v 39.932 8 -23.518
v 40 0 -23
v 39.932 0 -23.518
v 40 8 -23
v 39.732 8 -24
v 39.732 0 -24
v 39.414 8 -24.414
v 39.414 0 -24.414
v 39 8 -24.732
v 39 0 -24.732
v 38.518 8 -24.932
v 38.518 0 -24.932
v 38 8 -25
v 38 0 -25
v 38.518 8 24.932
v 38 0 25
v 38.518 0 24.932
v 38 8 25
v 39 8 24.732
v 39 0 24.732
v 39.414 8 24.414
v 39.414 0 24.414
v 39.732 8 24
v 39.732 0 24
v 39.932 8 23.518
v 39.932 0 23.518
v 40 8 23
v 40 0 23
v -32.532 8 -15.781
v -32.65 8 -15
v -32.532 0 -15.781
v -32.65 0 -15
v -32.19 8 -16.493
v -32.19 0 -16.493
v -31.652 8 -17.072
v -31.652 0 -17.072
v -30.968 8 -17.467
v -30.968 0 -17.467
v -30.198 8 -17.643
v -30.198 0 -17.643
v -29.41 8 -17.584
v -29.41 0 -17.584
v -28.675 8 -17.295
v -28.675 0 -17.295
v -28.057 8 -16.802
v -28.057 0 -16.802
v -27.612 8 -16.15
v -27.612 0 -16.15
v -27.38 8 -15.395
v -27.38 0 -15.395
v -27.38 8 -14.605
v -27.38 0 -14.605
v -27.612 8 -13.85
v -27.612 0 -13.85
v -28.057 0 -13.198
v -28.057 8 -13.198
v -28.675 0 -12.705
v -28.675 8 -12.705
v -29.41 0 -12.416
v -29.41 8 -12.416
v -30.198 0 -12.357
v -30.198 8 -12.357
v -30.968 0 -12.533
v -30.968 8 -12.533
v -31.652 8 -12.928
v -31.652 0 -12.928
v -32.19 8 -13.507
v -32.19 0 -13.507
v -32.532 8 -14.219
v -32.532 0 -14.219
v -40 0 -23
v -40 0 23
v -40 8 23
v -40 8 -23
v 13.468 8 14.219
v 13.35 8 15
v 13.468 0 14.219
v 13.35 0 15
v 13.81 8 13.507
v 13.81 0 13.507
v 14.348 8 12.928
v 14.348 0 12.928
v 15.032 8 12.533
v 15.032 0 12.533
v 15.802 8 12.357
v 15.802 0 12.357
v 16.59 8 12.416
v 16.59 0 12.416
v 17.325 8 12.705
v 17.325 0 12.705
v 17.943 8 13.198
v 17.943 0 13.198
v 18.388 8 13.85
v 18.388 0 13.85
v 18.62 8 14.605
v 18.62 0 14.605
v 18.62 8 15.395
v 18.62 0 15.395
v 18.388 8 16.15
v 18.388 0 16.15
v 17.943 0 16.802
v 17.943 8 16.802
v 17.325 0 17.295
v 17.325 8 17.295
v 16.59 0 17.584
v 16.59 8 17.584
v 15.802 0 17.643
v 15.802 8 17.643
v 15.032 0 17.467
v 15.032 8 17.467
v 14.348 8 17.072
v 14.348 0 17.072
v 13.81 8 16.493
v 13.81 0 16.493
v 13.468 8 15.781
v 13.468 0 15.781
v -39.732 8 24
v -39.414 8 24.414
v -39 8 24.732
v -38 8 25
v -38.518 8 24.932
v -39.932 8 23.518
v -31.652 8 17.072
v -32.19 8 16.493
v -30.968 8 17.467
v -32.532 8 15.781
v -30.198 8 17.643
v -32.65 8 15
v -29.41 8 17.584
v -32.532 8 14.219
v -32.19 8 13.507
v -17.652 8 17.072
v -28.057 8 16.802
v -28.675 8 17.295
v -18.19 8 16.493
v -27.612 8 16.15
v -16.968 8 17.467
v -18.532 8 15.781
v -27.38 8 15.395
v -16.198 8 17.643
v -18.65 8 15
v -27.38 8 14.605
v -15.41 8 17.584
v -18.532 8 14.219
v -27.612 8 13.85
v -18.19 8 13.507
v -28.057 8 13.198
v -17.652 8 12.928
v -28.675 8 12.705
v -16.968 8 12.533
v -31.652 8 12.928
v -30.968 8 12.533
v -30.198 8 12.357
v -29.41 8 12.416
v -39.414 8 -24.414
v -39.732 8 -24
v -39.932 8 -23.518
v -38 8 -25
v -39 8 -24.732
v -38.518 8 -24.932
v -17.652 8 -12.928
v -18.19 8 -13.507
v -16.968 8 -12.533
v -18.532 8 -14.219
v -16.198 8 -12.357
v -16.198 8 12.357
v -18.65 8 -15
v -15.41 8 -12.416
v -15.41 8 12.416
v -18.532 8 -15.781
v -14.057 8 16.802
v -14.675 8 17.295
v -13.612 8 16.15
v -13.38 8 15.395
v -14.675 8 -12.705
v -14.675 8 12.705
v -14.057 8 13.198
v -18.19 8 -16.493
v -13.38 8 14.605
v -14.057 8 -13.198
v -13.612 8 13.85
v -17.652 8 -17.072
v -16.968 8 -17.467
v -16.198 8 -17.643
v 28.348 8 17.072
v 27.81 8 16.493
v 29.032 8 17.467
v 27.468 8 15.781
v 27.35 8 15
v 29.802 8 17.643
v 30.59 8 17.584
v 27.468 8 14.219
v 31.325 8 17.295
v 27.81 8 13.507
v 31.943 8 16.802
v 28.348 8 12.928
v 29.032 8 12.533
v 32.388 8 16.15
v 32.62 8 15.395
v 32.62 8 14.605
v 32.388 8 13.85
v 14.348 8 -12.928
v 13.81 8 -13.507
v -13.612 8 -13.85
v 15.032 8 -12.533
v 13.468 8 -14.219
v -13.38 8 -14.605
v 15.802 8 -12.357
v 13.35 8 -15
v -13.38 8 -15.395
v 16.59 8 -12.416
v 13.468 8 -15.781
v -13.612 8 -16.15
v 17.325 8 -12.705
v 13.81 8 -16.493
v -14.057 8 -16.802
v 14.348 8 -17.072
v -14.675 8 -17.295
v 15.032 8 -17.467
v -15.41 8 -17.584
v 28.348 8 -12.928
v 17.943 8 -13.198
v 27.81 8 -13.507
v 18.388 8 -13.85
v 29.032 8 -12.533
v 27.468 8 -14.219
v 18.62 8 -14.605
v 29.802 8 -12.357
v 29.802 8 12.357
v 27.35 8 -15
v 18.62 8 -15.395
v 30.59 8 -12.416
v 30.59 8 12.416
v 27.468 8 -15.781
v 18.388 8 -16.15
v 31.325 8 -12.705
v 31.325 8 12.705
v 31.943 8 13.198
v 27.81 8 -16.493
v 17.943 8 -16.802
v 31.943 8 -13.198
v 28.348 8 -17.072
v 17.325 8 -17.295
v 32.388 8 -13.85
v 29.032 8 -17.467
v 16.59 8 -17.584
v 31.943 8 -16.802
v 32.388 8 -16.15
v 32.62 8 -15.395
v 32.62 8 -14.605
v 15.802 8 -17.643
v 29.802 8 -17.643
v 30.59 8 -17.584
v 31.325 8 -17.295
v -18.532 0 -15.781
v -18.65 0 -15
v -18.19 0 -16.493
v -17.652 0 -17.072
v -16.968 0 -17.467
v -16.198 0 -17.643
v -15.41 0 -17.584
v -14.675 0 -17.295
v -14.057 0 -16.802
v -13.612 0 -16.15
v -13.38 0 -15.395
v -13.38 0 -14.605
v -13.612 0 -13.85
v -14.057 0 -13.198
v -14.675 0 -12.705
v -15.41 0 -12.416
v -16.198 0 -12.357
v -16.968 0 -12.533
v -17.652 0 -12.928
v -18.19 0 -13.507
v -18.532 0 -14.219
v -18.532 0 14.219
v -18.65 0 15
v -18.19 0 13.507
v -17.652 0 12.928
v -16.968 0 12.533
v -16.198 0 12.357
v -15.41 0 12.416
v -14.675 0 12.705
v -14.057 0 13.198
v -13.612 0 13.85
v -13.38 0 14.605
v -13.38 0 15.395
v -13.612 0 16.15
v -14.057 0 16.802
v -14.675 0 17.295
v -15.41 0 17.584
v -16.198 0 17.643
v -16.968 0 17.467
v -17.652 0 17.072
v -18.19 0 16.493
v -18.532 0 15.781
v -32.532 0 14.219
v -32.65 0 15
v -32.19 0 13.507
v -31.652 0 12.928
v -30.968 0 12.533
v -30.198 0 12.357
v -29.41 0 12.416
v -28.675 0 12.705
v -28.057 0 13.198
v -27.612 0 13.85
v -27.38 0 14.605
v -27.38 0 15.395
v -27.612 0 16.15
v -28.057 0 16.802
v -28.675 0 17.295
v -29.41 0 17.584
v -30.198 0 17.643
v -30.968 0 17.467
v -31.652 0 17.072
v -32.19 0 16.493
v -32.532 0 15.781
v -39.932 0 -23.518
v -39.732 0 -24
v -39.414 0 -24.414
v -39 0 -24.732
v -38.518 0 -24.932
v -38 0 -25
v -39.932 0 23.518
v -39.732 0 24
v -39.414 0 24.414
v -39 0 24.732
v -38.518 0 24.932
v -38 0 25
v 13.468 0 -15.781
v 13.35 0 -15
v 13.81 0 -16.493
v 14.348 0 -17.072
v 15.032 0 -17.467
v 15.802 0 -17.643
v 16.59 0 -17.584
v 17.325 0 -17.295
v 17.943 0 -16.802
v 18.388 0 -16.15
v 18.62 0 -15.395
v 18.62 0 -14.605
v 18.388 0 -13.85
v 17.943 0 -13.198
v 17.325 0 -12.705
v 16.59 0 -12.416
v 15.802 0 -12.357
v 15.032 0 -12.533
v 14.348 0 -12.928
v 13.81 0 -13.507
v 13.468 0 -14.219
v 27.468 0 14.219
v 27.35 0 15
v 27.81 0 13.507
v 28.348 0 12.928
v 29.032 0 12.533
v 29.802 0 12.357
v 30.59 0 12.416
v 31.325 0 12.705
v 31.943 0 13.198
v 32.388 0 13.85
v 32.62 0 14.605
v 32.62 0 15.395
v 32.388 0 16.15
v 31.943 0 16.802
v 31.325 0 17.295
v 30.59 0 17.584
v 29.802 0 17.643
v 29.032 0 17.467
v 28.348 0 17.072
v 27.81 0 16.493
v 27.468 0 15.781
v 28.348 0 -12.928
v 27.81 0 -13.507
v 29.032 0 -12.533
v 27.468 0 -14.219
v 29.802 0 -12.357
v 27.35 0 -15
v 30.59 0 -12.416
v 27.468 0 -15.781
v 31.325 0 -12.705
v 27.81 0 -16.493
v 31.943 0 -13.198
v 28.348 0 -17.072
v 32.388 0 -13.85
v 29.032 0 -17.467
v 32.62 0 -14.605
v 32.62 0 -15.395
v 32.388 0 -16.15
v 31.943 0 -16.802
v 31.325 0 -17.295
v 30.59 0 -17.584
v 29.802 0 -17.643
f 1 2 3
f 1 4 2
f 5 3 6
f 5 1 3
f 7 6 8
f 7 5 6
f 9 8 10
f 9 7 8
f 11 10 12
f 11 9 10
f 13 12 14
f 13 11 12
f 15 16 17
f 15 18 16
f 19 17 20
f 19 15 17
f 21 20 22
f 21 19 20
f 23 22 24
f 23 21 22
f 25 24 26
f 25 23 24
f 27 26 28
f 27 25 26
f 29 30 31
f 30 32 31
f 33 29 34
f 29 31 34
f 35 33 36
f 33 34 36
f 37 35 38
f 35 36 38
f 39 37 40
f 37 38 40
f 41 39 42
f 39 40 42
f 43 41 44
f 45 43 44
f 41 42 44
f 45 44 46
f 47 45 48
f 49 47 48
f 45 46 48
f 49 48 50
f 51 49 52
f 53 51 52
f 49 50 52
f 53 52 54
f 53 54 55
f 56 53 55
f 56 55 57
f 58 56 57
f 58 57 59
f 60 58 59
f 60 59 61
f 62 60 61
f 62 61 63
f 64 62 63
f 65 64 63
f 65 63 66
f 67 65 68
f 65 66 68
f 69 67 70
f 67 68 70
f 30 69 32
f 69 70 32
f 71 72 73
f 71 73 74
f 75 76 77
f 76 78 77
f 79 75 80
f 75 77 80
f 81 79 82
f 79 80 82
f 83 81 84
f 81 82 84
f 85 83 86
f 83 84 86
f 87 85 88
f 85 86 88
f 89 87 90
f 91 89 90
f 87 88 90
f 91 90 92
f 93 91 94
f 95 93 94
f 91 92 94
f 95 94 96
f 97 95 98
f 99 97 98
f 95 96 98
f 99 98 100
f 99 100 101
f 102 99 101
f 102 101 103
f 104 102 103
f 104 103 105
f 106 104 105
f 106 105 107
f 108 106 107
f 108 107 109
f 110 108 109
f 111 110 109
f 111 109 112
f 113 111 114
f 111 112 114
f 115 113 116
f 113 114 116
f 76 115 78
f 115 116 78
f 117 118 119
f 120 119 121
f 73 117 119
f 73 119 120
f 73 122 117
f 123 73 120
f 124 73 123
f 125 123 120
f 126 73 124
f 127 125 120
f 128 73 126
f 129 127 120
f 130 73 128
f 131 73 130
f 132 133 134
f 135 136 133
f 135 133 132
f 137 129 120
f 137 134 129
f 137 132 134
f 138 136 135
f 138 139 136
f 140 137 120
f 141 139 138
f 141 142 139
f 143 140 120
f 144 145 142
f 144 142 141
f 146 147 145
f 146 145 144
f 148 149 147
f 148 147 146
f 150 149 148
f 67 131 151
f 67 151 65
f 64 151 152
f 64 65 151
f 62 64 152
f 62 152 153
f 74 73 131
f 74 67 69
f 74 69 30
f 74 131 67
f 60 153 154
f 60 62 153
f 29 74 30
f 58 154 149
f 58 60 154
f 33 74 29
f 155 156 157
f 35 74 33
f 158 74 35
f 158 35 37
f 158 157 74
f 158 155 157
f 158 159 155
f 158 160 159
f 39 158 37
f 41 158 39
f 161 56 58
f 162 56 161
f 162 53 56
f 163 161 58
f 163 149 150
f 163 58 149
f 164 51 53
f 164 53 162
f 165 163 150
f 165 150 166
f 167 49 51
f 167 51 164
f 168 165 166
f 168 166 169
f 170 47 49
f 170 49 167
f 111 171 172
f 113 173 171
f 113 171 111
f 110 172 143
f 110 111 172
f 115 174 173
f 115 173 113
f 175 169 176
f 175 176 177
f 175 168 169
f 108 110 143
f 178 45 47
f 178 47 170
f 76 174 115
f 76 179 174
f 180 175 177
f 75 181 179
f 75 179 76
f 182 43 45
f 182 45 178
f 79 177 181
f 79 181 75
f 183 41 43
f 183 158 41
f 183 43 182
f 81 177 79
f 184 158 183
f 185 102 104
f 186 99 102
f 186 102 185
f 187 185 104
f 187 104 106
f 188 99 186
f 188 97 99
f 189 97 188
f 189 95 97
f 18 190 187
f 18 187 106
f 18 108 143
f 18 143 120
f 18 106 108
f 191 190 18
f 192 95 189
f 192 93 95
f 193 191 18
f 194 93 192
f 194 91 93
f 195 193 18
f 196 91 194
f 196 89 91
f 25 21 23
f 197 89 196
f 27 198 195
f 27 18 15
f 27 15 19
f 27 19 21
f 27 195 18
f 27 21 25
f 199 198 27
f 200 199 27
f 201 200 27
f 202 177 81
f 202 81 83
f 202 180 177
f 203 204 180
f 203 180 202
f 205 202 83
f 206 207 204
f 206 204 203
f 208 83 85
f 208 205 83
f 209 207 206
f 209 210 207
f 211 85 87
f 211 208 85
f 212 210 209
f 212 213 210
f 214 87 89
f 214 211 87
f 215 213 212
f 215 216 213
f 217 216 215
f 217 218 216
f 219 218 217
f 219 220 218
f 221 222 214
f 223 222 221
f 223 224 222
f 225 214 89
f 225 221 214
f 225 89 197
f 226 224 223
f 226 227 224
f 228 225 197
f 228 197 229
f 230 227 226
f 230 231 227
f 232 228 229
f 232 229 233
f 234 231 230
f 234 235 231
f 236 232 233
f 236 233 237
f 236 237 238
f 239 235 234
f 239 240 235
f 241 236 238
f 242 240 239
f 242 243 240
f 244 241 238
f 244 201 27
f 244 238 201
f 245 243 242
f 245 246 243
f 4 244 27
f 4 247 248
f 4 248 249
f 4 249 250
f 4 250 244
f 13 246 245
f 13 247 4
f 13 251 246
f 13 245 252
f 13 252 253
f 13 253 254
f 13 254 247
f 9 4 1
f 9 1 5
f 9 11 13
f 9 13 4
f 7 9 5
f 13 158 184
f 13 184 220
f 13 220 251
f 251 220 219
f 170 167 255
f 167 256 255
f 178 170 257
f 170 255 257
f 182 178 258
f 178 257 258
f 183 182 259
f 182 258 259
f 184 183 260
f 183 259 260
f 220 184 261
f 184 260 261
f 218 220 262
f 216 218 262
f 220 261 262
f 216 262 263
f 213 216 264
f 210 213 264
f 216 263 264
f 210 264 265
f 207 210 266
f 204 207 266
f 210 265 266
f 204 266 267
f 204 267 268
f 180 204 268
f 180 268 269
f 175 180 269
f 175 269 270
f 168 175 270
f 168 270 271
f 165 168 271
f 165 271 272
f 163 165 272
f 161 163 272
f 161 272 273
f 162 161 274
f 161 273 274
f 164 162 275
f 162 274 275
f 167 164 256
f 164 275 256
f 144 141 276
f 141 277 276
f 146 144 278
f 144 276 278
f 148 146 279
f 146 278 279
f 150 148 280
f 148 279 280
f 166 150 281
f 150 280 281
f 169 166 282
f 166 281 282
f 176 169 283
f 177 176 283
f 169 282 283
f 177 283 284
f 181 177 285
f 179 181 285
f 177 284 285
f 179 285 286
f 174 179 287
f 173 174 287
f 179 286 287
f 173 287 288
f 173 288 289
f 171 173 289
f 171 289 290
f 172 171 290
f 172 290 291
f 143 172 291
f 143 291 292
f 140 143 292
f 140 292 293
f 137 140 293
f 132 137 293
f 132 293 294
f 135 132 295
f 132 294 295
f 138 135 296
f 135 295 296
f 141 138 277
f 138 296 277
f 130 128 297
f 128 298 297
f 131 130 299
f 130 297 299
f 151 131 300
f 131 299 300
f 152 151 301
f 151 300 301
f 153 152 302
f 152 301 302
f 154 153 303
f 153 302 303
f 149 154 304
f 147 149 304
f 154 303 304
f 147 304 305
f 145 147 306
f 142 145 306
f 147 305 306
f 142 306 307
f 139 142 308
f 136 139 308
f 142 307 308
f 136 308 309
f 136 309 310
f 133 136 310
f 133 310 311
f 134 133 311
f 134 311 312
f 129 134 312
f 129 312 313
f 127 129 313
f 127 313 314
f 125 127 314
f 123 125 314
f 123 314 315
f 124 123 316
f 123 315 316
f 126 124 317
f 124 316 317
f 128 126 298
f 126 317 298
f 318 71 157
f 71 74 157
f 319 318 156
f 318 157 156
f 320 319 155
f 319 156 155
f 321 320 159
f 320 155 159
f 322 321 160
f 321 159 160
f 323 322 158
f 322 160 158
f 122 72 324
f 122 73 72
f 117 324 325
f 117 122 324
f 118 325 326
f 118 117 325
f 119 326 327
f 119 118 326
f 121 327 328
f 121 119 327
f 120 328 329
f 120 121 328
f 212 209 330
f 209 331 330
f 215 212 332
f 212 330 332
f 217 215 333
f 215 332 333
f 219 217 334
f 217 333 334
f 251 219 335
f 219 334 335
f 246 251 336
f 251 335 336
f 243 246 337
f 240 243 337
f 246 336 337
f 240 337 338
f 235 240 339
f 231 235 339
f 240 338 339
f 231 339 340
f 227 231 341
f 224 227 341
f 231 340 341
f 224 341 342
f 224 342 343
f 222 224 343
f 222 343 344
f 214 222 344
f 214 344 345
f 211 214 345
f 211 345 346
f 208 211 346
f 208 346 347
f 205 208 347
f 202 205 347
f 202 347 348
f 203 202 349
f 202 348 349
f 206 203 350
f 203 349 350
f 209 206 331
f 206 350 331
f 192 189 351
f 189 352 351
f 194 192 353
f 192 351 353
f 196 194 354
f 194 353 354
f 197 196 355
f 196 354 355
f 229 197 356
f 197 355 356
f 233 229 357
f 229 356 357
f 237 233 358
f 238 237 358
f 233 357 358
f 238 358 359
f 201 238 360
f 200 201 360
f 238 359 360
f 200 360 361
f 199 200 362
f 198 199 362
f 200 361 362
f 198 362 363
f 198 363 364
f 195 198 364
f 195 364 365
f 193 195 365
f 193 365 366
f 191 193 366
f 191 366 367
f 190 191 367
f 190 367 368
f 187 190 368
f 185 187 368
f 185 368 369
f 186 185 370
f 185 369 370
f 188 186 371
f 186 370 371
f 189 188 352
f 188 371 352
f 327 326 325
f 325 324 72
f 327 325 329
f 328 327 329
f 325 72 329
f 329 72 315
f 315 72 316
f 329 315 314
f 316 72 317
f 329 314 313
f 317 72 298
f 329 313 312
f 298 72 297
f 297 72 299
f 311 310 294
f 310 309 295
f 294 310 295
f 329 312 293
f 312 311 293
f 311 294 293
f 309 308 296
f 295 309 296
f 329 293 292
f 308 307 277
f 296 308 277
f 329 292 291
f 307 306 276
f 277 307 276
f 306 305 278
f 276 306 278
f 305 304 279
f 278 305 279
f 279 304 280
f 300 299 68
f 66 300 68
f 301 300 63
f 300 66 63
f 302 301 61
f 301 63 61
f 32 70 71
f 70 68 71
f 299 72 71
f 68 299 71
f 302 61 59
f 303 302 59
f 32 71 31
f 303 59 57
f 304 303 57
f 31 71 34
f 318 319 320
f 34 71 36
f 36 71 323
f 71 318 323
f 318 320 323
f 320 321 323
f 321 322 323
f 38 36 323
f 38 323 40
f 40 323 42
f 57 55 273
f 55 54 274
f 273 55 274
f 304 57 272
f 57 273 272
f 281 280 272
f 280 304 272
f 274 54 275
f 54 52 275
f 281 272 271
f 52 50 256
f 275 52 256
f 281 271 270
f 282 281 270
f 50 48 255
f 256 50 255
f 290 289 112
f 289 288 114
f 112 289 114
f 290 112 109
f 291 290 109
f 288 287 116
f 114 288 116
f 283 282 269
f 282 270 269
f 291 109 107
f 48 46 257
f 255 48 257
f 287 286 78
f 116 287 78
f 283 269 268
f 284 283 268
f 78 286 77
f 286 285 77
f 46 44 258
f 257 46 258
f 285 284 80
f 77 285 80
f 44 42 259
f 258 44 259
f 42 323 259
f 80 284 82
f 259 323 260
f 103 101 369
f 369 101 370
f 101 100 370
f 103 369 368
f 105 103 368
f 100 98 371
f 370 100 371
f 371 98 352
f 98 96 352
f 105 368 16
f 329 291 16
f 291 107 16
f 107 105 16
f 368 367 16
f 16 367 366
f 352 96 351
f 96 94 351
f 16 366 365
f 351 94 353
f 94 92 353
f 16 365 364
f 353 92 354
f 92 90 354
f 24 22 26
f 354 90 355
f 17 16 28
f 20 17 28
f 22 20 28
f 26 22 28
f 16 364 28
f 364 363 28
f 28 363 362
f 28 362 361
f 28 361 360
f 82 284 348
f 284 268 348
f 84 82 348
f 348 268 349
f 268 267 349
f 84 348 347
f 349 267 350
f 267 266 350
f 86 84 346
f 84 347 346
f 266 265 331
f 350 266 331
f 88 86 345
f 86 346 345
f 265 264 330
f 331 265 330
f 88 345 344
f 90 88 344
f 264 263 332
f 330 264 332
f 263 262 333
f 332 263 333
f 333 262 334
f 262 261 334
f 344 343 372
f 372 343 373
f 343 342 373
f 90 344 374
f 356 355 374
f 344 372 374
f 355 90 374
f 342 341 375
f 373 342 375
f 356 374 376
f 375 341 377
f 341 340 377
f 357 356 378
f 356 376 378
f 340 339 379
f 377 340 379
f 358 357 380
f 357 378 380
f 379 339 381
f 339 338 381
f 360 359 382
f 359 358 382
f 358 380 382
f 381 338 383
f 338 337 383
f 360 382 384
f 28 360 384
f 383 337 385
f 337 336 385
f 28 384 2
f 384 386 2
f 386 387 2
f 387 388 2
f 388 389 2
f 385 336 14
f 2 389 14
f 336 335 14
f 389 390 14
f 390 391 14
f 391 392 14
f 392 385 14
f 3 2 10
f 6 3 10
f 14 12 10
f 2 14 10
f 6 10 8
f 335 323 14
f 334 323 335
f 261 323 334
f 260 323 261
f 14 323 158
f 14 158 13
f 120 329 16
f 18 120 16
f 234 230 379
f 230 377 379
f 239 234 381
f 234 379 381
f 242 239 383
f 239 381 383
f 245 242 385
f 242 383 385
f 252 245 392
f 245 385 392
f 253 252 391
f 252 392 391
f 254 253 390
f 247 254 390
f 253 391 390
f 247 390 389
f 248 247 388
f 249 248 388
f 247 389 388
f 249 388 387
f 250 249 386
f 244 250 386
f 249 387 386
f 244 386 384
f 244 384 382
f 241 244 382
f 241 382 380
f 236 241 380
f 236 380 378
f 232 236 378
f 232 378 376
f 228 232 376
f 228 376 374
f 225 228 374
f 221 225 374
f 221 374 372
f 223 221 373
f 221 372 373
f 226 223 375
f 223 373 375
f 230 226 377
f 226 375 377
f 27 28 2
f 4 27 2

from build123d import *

# Parameters (mm, degrees)
SKETCH1_W                = 80
SKETCH1_H                = 50
BOSS_EXTRUDE1_DEPTH      = 8
FILLET1_R                = 2
M5_CLEARANCE_HOLE1_D     = 5.3
M5_CLEARANCE_HOLE1_DEPTH = 8
M5_CLEARANCE_HOLE1_TIP   = 1.59228064


with BuildPart() as part:
    # Sketch1 → Boss-Extrude1 (new body)
    with BuildSketch(Plane(origin=(0, 0, 0), x_dir=(1, 0, 0), z_dir=(0, 1, 0))):
        Rectangle(SKETCH1_W, SKETCH1_H)
    extrude(amount=BOSS_EXTRUDE1_DEPTH)

    # Fillet1
    fillet1_edges = [part.edges().sort_by_distance(p)[0] for p in [
        (-40, 4, -25),
        (40, 4, -25),
        (40, 4, 25),
        (-40, 4, 25),
    ]]
    fillet(fillet1_edges, radius=FILLET1_R)

    # M5 Clearance Hole1
    with Locations(Plane(origin=(0, 8, 0), x_dir=(1, 0, 0), z_dir=(0, 1, 0))):
        with Locations((-30, 15), (-16, 15), (-16, -15), (-30, -15), (30, -15), (16, -15), (16, 15), (30, 15)):
            Hole(M5_CLEARANCE_HOLE1_D / 2, depth=M5_CLEARANCE_HOLE1_DEPTH)
            with Locations((0, 0, -(M5_CLEARANCE_HOLE1_DEPTH + M5_CLEARANCE_HOLE1_TIP / 2))):  # 118° drill point
                Cone(0, M5_CLEARANCE_HOLE1_D / 2, M5_CLEARANCE_HOLE1_TIP, mode=Mode.SUBTRACT)


solid = part.part
